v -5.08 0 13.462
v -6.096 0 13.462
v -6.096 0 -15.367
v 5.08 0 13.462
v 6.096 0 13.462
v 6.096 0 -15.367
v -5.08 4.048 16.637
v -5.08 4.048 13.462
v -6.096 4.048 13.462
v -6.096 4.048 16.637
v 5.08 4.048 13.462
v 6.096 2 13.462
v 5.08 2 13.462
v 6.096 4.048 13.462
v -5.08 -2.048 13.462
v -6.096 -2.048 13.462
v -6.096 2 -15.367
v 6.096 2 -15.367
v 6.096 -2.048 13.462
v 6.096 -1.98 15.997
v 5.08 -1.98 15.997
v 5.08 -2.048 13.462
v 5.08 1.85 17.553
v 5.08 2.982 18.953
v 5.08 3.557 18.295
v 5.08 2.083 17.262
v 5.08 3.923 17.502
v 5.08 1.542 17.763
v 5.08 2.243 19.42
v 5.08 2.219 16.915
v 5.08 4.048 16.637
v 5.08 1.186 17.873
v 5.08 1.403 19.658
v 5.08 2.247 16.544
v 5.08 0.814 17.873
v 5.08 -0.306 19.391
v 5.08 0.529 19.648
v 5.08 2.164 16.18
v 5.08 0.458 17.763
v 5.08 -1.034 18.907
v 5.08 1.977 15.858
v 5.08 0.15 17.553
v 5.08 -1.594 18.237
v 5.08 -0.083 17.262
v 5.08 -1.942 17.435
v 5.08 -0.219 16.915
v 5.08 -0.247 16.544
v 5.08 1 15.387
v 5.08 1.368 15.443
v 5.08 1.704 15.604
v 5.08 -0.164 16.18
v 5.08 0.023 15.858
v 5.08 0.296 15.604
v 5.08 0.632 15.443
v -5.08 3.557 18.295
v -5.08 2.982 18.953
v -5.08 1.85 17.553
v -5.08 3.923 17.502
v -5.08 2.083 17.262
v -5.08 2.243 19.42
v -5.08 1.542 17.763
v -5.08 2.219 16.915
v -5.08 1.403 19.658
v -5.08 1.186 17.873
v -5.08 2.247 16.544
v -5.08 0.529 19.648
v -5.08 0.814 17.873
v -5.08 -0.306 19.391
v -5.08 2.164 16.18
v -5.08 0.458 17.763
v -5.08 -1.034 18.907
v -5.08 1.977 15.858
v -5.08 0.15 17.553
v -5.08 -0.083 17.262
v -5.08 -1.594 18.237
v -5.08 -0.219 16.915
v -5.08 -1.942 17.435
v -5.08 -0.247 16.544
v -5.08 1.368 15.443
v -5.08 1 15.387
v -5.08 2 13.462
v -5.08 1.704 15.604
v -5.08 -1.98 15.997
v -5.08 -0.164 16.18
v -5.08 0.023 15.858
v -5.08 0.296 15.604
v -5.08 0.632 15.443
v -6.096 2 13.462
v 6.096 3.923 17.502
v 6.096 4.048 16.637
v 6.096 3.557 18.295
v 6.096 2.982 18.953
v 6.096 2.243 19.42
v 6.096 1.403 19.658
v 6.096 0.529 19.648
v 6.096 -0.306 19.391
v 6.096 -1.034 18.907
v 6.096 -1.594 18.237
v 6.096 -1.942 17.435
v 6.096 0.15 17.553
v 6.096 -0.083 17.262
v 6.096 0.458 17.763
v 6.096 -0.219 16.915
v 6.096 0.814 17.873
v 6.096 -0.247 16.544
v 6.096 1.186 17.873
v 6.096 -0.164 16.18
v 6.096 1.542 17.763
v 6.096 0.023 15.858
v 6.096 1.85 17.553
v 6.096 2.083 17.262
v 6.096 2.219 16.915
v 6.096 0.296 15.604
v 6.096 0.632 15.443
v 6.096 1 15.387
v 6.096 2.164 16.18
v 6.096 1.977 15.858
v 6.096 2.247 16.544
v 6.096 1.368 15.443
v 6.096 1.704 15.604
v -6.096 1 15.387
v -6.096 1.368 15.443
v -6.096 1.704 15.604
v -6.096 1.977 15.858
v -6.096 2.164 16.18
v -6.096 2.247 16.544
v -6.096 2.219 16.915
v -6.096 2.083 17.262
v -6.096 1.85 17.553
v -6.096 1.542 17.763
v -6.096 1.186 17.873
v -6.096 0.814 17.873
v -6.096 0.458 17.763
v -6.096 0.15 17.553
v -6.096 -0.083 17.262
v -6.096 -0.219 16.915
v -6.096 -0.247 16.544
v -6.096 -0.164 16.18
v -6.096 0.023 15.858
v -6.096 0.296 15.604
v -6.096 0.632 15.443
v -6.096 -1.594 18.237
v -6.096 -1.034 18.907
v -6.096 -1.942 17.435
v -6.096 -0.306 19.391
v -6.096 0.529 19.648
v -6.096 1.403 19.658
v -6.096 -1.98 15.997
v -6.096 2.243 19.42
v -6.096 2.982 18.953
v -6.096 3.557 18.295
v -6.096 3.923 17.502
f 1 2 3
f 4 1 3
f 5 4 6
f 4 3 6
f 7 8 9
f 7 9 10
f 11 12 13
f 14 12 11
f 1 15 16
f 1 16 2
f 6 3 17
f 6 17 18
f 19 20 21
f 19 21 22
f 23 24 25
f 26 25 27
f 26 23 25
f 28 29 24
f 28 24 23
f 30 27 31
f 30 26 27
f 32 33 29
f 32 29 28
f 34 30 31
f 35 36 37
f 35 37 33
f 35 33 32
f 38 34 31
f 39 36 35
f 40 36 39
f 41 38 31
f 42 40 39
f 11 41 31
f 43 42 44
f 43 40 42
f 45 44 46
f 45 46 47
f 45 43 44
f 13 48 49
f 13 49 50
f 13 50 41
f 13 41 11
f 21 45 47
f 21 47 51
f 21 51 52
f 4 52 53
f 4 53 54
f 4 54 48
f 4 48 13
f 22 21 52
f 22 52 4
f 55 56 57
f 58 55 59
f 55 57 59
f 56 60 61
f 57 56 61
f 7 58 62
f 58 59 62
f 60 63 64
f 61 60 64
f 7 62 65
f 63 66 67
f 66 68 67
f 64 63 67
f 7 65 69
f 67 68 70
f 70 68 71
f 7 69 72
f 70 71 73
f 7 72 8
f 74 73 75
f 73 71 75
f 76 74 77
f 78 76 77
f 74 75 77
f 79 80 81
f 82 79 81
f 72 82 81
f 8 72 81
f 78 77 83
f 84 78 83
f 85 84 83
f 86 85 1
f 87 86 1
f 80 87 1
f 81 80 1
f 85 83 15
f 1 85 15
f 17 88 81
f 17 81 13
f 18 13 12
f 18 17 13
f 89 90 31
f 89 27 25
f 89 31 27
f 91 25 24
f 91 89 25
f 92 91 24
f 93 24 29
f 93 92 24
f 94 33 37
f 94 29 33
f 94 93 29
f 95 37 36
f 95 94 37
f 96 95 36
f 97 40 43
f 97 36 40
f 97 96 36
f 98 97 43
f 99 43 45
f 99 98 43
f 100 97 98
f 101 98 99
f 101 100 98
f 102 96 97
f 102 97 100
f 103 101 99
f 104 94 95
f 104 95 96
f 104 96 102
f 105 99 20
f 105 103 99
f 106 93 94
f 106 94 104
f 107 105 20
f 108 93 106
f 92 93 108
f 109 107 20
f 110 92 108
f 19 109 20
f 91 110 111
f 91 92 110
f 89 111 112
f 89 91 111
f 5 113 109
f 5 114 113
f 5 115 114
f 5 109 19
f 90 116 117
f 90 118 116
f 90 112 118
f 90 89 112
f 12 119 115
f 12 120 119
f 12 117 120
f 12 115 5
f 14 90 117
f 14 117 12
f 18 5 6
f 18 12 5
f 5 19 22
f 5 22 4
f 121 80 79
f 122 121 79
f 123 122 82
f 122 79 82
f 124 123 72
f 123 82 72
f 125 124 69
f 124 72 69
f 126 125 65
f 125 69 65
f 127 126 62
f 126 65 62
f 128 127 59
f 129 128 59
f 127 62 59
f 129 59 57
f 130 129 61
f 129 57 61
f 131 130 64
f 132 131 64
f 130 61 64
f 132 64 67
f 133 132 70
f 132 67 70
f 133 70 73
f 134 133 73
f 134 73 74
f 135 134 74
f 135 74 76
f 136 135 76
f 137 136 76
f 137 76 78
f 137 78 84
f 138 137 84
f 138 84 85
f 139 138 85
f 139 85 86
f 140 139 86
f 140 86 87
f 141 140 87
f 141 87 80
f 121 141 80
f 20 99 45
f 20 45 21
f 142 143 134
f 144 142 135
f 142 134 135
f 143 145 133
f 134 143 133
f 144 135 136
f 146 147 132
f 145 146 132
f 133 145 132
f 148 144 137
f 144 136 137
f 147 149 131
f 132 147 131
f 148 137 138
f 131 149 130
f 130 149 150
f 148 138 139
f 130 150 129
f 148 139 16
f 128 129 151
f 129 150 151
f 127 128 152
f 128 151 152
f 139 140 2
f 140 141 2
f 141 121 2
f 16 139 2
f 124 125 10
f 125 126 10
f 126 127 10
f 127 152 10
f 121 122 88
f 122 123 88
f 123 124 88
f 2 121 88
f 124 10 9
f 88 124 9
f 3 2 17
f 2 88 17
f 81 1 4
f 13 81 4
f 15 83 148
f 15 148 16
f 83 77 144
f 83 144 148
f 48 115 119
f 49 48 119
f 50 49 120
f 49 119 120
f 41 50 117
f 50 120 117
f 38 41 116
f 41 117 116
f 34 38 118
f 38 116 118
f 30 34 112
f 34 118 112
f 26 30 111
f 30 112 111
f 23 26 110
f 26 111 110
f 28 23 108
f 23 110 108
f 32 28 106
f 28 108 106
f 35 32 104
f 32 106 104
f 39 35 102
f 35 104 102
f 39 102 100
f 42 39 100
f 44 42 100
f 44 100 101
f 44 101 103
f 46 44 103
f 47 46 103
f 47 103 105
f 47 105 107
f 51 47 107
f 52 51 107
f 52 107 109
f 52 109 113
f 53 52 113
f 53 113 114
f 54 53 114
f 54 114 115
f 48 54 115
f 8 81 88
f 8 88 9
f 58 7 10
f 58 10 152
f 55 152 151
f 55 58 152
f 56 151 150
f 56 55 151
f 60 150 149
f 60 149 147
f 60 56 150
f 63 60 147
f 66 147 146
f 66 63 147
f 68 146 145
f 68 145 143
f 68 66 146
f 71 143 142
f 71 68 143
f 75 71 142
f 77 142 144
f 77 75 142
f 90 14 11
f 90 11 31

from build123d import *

# Parameters (mm, degrees)
SKETCH1_W               = 12.192
SKETCH1_H               = 30.734
BOSS_EXTRUDE1_DEPTH     = 2
BOSS_EXTRUDE2_DEPTH     = 12.192
SKETCH3_R               = 1.25
CUT_EXTRUDE1_DEPTH      = 24.505965051
CUT_EXTRUDE2_DEPTH      = 22.001112947
CUT_EXTRUDE2_DEPTH_BACK = 22.001112947
SKETCH4_W               = 10.16
SKETCH4_H               = 6.223


with BuildPart() as part:
    # Sketch1 → Boss-Extrude1 (new body)
    with BuildSketch(Plane(origin=(0, 0, 0), x_dir=(1, 0, 0), z_dir=(0, 1, 0))):
        Rectangle(SKETCH1_W, SKETCH1_H)
    extrude(amount=BOSS_EXTRUDE1_DEPTH)

    # Sketch2 → Boss-Extrude2 (add)
    with BuildSketch(Plane(origin=(6.096, 0, 0), x_dir=(0, 0, -1), z_dir=(1, 0, 0))):
        with BuildLine():
            ThreePointArc((-13.757711199, 0), (-14.618095322, -1.28349029), (-15.997337956, -1.980123566))
            Line((-15.997337956, -1.980123566), (-13.462, -2.048))
            Line((-13.462, -2.048), (-13.462, 0))
            Line((-13.462, 0), (-13.757711199, 0))
        make_face()
        with BuildLine():
            Line((-13.462, 2), (-13.757711199, 2))
            ThreePointArc((-13.757711199, 2), (-13.631473734, 1.50706594), (-13.589, 1))
            ThreePointArc((-13.589, 1), (-13.631473734, 0.49293406), (-13.757711199, 0))
            Line((-13.757711199, 0), (-13.462, 0))
            Line((-13.462, 0), (-13.462, 2))
        make_face()
        with BuildLine():
            Line((-13.462, 4.048), (-16.637, 4.048))
            ThreePointArc((-16.637, 4.048), (-14.870321761, 3.483777768), (-13.757711199, 2))
            Line((-13.757711199, 2), (-13.462, 2))
            Line((-13.462, 2), (-13.462, 4.048))
        make_face()
        with BuildLine():
            ThreePointArc((-13.757711199, 2), (-14.870321761, 3.483777768), (-16.637, 4.048))
            ThreePointArc((-16.637, 4.048), (-19.658290199, 1.402628284), (-17.435200057, -1.941628914))
            Line((-17.435200057, -1.941628914), (-15.997337956, -1.980123566))
            ThreePointArc((-15.997337956, -1.980123566), (-14.618095322, -1.28349029), (-13.757711199, 0))
            Line((-13.757711199, 0), (-15.367, 0))
            Line((-15.367, 0), (-15.367, 2))
            Line((-15.367, 2), (-13.757711199, 2))
        make_face()
    extrude(amount=-BOSS_EXTRUDE2_DEPTH)

    # Sketch3 → Cut-Extrude1 (cut, through all)
    with BuildSketch(Plane(origin=(6.096, 0, 0), x_dir=(0, 0, -1), z_dir=(1, 0, 0))):
        with Locations((-16.637, 1)):
            Circle(SKETCH3_R)
    extrude(amount=-CUT_EXTRUDE1_DEPTH, mode=Mode.SUBTRACT)

    # Sketch4 → Cut-Extrude2 (cut, two sides: drawn at the far end of the back side and taken through both)
    with BuildSketch(Plane(origin=(0, 2, 0), x_dir=(1, 0, 0), z_dir=(0, 1, 0)).offset(-CUT_EXTRUDE2_DEPTH_BACK)):
        with Locations((0, -16.5735)):
            Rectangle(SKETCH4_W, SKETCH4_H)
    extrude(amount=CUT_EXTRUDE2_DEPTH + CUT_EXTRUDE2_DEPTH_BACK, mode=Mode.SUBTRACT)


solid = part.part
